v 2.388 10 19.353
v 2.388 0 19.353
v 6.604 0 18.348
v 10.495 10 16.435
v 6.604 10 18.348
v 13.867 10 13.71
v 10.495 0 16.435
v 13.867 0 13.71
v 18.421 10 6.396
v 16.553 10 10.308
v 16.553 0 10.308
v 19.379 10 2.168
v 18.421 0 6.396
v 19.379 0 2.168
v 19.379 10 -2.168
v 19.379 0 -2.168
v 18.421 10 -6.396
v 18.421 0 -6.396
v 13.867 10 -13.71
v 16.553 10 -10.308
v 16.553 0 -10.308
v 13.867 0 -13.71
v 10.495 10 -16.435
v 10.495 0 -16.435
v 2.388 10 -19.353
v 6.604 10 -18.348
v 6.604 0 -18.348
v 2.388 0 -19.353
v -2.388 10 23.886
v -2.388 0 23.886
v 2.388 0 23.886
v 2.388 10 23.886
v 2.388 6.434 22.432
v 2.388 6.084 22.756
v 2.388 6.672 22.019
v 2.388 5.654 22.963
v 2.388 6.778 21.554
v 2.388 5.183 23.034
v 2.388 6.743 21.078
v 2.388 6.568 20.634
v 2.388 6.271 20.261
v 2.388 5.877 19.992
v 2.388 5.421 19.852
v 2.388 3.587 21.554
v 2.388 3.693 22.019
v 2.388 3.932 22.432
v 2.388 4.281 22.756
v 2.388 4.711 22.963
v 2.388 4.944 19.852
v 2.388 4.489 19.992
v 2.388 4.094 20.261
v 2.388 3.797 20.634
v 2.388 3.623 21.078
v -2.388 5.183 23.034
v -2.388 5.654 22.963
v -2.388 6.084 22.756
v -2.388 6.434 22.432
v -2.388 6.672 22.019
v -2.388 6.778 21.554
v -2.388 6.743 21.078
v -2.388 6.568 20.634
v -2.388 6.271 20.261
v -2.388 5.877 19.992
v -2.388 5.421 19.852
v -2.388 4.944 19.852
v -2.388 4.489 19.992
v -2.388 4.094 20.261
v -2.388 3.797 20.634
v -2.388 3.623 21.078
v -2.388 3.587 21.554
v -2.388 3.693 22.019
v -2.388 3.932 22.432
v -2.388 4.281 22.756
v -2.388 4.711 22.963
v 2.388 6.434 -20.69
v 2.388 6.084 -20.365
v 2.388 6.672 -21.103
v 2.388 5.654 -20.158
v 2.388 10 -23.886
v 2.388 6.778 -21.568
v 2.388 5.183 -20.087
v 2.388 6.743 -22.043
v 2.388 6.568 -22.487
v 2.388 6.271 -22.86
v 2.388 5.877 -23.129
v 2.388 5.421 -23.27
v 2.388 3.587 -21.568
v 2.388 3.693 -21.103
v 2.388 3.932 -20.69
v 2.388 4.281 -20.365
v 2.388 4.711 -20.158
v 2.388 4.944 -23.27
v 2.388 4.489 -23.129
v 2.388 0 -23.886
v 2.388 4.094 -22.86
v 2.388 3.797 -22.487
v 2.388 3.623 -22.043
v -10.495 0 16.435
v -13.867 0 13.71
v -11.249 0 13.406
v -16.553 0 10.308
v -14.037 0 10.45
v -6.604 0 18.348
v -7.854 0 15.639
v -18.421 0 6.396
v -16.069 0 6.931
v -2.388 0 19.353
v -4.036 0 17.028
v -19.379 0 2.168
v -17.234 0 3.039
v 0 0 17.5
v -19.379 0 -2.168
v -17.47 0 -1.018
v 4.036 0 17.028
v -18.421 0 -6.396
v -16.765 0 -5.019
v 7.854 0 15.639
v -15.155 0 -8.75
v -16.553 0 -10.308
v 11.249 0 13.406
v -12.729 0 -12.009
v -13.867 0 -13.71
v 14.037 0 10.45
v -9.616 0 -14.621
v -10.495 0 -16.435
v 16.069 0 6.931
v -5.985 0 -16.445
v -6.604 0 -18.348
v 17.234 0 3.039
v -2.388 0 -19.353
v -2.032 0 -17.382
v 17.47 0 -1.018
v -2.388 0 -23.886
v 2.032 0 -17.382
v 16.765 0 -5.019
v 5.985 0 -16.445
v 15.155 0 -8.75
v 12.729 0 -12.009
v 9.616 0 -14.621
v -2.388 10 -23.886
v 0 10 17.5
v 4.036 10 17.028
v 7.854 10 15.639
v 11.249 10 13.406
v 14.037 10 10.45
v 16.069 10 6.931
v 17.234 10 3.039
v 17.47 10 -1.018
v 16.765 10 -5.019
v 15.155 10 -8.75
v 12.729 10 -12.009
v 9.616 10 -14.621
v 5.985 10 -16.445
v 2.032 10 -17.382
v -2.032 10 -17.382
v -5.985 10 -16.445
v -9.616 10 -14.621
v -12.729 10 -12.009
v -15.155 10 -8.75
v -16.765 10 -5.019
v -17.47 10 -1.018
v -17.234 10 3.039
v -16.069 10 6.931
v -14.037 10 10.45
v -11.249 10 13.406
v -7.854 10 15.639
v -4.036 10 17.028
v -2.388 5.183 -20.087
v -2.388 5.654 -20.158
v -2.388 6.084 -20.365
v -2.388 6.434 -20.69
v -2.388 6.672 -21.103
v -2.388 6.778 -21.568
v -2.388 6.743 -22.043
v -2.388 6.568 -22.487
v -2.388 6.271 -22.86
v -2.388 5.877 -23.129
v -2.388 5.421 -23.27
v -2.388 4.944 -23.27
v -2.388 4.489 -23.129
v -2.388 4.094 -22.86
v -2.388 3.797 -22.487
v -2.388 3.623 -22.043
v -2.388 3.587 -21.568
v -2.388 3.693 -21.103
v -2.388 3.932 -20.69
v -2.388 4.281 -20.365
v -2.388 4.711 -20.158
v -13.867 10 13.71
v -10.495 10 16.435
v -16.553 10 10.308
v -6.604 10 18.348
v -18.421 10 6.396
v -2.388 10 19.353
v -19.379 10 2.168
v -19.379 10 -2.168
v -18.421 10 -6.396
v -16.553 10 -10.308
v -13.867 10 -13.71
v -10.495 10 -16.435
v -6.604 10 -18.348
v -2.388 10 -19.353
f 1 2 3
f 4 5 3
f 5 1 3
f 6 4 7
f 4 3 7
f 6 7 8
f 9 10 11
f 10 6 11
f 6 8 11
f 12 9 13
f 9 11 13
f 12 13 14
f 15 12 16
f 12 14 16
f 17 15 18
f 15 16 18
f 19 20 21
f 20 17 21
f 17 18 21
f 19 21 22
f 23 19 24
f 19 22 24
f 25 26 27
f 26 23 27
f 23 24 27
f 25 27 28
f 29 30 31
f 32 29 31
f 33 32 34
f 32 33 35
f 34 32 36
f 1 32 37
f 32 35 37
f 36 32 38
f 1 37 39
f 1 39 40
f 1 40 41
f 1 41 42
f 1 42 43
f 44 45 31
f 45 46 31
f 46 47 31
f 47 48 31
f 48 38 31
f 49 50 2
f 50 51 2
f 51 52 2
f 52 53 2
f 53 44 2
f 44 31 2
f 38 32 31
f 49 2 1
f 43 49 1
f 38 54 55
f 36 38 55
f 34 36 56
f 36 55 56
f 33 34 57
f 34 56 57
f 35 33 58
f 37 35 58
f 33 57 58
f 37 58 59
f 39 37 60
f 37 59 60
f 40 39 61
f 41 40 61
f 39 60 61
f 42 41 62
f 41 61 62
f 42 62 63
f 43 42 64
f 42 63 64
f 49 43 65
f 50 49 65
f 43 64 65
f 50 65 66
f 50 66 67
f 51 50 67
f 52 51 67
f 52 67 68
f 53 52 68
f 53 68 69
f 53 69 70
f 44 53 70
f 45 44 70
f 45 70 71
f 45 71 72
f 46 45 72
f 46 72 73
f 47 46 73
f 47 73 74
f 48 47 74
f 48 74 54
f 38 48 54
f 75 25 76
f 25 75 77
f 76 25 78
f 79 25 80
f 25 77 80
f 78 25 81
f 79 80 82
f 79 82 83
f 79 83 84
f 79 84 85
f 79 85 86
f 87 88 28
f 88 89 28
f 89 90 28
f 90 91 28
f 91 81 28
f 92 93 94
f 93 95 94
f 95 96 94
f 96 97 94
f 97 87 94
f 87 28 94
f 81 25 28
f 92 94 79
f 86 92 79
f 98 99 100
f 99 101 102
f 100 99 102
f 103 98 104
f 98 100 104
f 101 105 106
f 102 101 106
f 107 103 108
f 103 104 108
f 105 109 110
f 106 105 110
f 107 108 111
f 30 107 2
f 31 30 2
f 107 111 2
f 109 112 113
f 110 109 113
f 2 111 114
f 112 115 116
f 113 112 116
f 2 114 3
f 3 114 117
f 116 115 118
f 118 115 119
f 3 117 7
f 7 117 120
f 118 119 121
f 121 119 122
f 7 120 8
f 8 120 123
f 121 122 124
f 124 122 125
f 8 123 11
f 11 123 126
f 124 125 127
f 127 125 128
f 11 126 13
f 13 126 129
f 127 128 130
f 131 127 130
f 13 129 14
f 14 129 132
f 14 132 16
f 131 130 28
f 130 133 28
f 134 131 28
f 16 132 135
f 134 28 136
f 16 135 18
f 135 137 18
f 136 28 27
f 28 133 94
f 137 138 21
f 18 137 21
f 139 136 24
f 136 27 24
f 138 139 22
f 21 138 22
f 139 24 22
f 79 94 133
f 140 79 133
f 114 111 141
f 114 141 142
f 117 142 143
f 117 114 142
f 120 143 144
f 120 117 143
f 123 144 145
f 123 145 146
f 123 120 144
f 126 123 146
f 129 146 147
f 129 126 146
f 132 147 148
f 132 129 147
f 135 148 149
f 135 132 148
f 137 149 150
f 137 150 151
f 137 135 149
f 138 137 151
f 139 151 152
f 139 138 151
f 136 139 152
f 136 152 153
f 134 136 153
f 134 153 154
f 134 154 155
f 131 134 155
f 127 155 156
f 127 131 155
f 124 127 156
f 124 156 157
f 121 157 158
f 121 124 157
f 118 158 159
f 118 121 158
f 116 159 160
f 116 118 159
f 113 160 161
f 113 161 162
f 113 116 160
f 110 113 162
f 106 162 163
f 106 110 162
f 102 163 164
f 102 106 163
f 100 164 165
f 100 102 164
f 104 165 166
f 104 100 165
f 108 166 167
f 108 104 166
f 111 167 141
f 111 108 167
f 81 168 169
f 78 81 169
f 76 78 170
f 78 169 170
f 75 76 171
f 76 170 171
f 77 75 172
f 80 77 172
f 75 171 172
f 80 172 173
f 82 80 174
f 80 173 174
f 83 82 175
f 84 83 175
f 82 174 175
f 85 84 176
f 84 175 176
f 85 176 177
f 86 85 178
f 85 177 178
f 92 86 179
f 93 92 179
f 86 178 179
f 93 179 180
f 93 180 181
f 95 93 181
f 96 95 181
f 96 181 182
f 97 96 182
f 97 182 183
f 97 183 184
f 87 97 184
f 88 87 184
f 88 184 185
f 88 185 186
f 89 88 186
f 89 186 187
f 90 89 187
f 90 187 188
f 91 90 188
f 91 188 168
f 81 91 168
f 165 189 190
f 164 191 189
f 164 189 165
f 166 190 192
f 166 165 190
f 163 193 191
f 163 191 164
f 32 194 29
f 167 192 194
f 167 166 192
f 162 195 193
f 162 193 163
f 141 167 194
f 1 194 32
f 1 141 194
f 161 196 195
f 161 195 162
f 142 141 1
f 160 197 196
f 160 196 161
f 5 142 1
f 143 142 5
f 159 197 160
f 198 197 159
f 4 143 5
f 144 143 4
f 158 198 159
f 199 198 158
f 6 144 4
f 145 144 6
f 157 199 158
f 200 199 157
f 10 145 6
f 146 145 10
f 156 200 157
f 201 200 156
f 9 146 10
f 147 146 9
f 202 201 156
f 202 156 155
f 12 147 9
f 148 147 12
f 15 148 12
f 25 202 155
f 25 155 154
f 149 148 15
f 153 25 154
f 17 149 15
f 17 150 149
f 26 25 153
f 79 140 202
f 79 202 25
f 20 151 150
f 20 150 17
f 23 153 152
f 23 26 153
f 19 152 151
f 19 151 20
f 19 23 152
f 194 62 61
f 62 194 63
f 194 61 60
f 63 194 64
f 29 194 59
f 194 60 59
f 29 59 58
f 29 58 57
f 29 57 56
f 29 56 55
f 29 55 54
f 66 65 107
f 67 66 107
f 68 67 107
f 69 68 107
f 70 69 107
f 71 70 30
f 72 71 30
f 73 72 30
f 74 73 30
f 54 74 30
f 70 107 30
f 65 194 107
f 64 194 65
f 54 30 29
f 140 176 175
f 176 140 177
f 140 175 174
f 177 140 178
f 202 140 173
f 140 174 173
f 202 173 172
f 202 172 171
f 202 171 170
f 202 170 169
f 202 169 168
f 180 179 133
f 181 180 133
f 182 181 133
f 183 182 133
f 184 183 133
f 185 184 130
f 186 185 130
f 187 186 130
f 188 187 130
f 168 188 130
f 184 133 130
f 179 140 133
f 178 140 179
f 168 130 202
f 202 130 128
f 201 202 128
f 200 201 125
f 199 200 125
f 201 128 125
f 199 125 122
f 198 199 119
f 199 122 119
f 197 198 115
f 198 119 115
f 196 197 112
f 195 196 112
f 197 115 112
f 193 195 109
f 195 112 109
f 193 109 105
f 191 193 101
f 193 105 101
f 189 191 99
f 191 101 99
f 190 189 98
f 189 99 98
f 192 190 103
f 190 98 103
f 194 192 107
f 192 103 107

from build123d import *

# Parameters (mm, degrees)
SKETCH2_R           = 19.5
SKETCH2_R_2         = 17.5
BOSS_EXTRUDE2_DEPTH = 10
SKETCH3_R           = 1.6
CUT_EXTRUDE1_DEPTH  = 10


with BuildPart() as part:
    # Sketch2 → Boss-Extrude2 (new body)
    # profile 1 of 3: a face of its own
    with BuildSketch(Plane(origin=(0, 0, 0), x_dir=(1, 0, 0), z_dir=(0, 1, 0))):
        Circle(SKETCH2_R)
        with Locations(Location((0, 0, 0), (0, 0, 270))):
            Circle(SKETCH2_R_2, mode=Mode.SUBTRACT)
    # profile 2 of 3: a face of its own
    with BuildSketch(Plane(origin=(0, 0, 0), x_dir=(1, 0, 0), z_dir=(0, 1, 0))):
        with BuildLine():
            ThreePointArc((-2.387522163, 19.353287522), (0, 19.5), (2.387522163, 19.353287522))
            Line((2.387522163, 19.353287522), (2.387522163, 23.886441242))
            Line((2.387522163, 23.886441242), (-2.387522163, 23.886441242))
            Line((-2.387522163, 23.886441242), (-2.387522163, 19.353287522))
        make_face()
    # profile 3 of 3: a face of its own
    with BuildSketch(Plane(origin=(0, 0, 0), x_dir=(1, 0, 0), z_dir=(0, 1, 0))):
        with BuildLine():
            Line((2.387522163, -23.886441242), (2.387522163, -19.353287522))
            ThreePointArc((2.387522163, -19.353287522), (0, -19.5), (-2.387522163, -19.353287522))
            Line((-2.387522163, -19.353287522), (-2.387522163, -23.886441242))
            Line((-2.387522163, -23.886441242), (2.387522163, -23.886441242))
        make_face()
    extrude(amount=BOSS_EXTRUDE2_DEPTH)

    # Sketch3 → Cut-Extrude1 (cut)
    with BuildSketch(Plane.ZY.offset(2.387522163)):
        with Locations((-21.687379423, 5.18275768)):
            Circle(SKETCH3_R)
        with Locations((21.434001351, 5.18275768)):
            Circle(SKETCH3_R)
    extrude(amount=-CUT_EXTRUDE1_DEPTH, mode=Mode.SUBTRACT)


solid = part.part
